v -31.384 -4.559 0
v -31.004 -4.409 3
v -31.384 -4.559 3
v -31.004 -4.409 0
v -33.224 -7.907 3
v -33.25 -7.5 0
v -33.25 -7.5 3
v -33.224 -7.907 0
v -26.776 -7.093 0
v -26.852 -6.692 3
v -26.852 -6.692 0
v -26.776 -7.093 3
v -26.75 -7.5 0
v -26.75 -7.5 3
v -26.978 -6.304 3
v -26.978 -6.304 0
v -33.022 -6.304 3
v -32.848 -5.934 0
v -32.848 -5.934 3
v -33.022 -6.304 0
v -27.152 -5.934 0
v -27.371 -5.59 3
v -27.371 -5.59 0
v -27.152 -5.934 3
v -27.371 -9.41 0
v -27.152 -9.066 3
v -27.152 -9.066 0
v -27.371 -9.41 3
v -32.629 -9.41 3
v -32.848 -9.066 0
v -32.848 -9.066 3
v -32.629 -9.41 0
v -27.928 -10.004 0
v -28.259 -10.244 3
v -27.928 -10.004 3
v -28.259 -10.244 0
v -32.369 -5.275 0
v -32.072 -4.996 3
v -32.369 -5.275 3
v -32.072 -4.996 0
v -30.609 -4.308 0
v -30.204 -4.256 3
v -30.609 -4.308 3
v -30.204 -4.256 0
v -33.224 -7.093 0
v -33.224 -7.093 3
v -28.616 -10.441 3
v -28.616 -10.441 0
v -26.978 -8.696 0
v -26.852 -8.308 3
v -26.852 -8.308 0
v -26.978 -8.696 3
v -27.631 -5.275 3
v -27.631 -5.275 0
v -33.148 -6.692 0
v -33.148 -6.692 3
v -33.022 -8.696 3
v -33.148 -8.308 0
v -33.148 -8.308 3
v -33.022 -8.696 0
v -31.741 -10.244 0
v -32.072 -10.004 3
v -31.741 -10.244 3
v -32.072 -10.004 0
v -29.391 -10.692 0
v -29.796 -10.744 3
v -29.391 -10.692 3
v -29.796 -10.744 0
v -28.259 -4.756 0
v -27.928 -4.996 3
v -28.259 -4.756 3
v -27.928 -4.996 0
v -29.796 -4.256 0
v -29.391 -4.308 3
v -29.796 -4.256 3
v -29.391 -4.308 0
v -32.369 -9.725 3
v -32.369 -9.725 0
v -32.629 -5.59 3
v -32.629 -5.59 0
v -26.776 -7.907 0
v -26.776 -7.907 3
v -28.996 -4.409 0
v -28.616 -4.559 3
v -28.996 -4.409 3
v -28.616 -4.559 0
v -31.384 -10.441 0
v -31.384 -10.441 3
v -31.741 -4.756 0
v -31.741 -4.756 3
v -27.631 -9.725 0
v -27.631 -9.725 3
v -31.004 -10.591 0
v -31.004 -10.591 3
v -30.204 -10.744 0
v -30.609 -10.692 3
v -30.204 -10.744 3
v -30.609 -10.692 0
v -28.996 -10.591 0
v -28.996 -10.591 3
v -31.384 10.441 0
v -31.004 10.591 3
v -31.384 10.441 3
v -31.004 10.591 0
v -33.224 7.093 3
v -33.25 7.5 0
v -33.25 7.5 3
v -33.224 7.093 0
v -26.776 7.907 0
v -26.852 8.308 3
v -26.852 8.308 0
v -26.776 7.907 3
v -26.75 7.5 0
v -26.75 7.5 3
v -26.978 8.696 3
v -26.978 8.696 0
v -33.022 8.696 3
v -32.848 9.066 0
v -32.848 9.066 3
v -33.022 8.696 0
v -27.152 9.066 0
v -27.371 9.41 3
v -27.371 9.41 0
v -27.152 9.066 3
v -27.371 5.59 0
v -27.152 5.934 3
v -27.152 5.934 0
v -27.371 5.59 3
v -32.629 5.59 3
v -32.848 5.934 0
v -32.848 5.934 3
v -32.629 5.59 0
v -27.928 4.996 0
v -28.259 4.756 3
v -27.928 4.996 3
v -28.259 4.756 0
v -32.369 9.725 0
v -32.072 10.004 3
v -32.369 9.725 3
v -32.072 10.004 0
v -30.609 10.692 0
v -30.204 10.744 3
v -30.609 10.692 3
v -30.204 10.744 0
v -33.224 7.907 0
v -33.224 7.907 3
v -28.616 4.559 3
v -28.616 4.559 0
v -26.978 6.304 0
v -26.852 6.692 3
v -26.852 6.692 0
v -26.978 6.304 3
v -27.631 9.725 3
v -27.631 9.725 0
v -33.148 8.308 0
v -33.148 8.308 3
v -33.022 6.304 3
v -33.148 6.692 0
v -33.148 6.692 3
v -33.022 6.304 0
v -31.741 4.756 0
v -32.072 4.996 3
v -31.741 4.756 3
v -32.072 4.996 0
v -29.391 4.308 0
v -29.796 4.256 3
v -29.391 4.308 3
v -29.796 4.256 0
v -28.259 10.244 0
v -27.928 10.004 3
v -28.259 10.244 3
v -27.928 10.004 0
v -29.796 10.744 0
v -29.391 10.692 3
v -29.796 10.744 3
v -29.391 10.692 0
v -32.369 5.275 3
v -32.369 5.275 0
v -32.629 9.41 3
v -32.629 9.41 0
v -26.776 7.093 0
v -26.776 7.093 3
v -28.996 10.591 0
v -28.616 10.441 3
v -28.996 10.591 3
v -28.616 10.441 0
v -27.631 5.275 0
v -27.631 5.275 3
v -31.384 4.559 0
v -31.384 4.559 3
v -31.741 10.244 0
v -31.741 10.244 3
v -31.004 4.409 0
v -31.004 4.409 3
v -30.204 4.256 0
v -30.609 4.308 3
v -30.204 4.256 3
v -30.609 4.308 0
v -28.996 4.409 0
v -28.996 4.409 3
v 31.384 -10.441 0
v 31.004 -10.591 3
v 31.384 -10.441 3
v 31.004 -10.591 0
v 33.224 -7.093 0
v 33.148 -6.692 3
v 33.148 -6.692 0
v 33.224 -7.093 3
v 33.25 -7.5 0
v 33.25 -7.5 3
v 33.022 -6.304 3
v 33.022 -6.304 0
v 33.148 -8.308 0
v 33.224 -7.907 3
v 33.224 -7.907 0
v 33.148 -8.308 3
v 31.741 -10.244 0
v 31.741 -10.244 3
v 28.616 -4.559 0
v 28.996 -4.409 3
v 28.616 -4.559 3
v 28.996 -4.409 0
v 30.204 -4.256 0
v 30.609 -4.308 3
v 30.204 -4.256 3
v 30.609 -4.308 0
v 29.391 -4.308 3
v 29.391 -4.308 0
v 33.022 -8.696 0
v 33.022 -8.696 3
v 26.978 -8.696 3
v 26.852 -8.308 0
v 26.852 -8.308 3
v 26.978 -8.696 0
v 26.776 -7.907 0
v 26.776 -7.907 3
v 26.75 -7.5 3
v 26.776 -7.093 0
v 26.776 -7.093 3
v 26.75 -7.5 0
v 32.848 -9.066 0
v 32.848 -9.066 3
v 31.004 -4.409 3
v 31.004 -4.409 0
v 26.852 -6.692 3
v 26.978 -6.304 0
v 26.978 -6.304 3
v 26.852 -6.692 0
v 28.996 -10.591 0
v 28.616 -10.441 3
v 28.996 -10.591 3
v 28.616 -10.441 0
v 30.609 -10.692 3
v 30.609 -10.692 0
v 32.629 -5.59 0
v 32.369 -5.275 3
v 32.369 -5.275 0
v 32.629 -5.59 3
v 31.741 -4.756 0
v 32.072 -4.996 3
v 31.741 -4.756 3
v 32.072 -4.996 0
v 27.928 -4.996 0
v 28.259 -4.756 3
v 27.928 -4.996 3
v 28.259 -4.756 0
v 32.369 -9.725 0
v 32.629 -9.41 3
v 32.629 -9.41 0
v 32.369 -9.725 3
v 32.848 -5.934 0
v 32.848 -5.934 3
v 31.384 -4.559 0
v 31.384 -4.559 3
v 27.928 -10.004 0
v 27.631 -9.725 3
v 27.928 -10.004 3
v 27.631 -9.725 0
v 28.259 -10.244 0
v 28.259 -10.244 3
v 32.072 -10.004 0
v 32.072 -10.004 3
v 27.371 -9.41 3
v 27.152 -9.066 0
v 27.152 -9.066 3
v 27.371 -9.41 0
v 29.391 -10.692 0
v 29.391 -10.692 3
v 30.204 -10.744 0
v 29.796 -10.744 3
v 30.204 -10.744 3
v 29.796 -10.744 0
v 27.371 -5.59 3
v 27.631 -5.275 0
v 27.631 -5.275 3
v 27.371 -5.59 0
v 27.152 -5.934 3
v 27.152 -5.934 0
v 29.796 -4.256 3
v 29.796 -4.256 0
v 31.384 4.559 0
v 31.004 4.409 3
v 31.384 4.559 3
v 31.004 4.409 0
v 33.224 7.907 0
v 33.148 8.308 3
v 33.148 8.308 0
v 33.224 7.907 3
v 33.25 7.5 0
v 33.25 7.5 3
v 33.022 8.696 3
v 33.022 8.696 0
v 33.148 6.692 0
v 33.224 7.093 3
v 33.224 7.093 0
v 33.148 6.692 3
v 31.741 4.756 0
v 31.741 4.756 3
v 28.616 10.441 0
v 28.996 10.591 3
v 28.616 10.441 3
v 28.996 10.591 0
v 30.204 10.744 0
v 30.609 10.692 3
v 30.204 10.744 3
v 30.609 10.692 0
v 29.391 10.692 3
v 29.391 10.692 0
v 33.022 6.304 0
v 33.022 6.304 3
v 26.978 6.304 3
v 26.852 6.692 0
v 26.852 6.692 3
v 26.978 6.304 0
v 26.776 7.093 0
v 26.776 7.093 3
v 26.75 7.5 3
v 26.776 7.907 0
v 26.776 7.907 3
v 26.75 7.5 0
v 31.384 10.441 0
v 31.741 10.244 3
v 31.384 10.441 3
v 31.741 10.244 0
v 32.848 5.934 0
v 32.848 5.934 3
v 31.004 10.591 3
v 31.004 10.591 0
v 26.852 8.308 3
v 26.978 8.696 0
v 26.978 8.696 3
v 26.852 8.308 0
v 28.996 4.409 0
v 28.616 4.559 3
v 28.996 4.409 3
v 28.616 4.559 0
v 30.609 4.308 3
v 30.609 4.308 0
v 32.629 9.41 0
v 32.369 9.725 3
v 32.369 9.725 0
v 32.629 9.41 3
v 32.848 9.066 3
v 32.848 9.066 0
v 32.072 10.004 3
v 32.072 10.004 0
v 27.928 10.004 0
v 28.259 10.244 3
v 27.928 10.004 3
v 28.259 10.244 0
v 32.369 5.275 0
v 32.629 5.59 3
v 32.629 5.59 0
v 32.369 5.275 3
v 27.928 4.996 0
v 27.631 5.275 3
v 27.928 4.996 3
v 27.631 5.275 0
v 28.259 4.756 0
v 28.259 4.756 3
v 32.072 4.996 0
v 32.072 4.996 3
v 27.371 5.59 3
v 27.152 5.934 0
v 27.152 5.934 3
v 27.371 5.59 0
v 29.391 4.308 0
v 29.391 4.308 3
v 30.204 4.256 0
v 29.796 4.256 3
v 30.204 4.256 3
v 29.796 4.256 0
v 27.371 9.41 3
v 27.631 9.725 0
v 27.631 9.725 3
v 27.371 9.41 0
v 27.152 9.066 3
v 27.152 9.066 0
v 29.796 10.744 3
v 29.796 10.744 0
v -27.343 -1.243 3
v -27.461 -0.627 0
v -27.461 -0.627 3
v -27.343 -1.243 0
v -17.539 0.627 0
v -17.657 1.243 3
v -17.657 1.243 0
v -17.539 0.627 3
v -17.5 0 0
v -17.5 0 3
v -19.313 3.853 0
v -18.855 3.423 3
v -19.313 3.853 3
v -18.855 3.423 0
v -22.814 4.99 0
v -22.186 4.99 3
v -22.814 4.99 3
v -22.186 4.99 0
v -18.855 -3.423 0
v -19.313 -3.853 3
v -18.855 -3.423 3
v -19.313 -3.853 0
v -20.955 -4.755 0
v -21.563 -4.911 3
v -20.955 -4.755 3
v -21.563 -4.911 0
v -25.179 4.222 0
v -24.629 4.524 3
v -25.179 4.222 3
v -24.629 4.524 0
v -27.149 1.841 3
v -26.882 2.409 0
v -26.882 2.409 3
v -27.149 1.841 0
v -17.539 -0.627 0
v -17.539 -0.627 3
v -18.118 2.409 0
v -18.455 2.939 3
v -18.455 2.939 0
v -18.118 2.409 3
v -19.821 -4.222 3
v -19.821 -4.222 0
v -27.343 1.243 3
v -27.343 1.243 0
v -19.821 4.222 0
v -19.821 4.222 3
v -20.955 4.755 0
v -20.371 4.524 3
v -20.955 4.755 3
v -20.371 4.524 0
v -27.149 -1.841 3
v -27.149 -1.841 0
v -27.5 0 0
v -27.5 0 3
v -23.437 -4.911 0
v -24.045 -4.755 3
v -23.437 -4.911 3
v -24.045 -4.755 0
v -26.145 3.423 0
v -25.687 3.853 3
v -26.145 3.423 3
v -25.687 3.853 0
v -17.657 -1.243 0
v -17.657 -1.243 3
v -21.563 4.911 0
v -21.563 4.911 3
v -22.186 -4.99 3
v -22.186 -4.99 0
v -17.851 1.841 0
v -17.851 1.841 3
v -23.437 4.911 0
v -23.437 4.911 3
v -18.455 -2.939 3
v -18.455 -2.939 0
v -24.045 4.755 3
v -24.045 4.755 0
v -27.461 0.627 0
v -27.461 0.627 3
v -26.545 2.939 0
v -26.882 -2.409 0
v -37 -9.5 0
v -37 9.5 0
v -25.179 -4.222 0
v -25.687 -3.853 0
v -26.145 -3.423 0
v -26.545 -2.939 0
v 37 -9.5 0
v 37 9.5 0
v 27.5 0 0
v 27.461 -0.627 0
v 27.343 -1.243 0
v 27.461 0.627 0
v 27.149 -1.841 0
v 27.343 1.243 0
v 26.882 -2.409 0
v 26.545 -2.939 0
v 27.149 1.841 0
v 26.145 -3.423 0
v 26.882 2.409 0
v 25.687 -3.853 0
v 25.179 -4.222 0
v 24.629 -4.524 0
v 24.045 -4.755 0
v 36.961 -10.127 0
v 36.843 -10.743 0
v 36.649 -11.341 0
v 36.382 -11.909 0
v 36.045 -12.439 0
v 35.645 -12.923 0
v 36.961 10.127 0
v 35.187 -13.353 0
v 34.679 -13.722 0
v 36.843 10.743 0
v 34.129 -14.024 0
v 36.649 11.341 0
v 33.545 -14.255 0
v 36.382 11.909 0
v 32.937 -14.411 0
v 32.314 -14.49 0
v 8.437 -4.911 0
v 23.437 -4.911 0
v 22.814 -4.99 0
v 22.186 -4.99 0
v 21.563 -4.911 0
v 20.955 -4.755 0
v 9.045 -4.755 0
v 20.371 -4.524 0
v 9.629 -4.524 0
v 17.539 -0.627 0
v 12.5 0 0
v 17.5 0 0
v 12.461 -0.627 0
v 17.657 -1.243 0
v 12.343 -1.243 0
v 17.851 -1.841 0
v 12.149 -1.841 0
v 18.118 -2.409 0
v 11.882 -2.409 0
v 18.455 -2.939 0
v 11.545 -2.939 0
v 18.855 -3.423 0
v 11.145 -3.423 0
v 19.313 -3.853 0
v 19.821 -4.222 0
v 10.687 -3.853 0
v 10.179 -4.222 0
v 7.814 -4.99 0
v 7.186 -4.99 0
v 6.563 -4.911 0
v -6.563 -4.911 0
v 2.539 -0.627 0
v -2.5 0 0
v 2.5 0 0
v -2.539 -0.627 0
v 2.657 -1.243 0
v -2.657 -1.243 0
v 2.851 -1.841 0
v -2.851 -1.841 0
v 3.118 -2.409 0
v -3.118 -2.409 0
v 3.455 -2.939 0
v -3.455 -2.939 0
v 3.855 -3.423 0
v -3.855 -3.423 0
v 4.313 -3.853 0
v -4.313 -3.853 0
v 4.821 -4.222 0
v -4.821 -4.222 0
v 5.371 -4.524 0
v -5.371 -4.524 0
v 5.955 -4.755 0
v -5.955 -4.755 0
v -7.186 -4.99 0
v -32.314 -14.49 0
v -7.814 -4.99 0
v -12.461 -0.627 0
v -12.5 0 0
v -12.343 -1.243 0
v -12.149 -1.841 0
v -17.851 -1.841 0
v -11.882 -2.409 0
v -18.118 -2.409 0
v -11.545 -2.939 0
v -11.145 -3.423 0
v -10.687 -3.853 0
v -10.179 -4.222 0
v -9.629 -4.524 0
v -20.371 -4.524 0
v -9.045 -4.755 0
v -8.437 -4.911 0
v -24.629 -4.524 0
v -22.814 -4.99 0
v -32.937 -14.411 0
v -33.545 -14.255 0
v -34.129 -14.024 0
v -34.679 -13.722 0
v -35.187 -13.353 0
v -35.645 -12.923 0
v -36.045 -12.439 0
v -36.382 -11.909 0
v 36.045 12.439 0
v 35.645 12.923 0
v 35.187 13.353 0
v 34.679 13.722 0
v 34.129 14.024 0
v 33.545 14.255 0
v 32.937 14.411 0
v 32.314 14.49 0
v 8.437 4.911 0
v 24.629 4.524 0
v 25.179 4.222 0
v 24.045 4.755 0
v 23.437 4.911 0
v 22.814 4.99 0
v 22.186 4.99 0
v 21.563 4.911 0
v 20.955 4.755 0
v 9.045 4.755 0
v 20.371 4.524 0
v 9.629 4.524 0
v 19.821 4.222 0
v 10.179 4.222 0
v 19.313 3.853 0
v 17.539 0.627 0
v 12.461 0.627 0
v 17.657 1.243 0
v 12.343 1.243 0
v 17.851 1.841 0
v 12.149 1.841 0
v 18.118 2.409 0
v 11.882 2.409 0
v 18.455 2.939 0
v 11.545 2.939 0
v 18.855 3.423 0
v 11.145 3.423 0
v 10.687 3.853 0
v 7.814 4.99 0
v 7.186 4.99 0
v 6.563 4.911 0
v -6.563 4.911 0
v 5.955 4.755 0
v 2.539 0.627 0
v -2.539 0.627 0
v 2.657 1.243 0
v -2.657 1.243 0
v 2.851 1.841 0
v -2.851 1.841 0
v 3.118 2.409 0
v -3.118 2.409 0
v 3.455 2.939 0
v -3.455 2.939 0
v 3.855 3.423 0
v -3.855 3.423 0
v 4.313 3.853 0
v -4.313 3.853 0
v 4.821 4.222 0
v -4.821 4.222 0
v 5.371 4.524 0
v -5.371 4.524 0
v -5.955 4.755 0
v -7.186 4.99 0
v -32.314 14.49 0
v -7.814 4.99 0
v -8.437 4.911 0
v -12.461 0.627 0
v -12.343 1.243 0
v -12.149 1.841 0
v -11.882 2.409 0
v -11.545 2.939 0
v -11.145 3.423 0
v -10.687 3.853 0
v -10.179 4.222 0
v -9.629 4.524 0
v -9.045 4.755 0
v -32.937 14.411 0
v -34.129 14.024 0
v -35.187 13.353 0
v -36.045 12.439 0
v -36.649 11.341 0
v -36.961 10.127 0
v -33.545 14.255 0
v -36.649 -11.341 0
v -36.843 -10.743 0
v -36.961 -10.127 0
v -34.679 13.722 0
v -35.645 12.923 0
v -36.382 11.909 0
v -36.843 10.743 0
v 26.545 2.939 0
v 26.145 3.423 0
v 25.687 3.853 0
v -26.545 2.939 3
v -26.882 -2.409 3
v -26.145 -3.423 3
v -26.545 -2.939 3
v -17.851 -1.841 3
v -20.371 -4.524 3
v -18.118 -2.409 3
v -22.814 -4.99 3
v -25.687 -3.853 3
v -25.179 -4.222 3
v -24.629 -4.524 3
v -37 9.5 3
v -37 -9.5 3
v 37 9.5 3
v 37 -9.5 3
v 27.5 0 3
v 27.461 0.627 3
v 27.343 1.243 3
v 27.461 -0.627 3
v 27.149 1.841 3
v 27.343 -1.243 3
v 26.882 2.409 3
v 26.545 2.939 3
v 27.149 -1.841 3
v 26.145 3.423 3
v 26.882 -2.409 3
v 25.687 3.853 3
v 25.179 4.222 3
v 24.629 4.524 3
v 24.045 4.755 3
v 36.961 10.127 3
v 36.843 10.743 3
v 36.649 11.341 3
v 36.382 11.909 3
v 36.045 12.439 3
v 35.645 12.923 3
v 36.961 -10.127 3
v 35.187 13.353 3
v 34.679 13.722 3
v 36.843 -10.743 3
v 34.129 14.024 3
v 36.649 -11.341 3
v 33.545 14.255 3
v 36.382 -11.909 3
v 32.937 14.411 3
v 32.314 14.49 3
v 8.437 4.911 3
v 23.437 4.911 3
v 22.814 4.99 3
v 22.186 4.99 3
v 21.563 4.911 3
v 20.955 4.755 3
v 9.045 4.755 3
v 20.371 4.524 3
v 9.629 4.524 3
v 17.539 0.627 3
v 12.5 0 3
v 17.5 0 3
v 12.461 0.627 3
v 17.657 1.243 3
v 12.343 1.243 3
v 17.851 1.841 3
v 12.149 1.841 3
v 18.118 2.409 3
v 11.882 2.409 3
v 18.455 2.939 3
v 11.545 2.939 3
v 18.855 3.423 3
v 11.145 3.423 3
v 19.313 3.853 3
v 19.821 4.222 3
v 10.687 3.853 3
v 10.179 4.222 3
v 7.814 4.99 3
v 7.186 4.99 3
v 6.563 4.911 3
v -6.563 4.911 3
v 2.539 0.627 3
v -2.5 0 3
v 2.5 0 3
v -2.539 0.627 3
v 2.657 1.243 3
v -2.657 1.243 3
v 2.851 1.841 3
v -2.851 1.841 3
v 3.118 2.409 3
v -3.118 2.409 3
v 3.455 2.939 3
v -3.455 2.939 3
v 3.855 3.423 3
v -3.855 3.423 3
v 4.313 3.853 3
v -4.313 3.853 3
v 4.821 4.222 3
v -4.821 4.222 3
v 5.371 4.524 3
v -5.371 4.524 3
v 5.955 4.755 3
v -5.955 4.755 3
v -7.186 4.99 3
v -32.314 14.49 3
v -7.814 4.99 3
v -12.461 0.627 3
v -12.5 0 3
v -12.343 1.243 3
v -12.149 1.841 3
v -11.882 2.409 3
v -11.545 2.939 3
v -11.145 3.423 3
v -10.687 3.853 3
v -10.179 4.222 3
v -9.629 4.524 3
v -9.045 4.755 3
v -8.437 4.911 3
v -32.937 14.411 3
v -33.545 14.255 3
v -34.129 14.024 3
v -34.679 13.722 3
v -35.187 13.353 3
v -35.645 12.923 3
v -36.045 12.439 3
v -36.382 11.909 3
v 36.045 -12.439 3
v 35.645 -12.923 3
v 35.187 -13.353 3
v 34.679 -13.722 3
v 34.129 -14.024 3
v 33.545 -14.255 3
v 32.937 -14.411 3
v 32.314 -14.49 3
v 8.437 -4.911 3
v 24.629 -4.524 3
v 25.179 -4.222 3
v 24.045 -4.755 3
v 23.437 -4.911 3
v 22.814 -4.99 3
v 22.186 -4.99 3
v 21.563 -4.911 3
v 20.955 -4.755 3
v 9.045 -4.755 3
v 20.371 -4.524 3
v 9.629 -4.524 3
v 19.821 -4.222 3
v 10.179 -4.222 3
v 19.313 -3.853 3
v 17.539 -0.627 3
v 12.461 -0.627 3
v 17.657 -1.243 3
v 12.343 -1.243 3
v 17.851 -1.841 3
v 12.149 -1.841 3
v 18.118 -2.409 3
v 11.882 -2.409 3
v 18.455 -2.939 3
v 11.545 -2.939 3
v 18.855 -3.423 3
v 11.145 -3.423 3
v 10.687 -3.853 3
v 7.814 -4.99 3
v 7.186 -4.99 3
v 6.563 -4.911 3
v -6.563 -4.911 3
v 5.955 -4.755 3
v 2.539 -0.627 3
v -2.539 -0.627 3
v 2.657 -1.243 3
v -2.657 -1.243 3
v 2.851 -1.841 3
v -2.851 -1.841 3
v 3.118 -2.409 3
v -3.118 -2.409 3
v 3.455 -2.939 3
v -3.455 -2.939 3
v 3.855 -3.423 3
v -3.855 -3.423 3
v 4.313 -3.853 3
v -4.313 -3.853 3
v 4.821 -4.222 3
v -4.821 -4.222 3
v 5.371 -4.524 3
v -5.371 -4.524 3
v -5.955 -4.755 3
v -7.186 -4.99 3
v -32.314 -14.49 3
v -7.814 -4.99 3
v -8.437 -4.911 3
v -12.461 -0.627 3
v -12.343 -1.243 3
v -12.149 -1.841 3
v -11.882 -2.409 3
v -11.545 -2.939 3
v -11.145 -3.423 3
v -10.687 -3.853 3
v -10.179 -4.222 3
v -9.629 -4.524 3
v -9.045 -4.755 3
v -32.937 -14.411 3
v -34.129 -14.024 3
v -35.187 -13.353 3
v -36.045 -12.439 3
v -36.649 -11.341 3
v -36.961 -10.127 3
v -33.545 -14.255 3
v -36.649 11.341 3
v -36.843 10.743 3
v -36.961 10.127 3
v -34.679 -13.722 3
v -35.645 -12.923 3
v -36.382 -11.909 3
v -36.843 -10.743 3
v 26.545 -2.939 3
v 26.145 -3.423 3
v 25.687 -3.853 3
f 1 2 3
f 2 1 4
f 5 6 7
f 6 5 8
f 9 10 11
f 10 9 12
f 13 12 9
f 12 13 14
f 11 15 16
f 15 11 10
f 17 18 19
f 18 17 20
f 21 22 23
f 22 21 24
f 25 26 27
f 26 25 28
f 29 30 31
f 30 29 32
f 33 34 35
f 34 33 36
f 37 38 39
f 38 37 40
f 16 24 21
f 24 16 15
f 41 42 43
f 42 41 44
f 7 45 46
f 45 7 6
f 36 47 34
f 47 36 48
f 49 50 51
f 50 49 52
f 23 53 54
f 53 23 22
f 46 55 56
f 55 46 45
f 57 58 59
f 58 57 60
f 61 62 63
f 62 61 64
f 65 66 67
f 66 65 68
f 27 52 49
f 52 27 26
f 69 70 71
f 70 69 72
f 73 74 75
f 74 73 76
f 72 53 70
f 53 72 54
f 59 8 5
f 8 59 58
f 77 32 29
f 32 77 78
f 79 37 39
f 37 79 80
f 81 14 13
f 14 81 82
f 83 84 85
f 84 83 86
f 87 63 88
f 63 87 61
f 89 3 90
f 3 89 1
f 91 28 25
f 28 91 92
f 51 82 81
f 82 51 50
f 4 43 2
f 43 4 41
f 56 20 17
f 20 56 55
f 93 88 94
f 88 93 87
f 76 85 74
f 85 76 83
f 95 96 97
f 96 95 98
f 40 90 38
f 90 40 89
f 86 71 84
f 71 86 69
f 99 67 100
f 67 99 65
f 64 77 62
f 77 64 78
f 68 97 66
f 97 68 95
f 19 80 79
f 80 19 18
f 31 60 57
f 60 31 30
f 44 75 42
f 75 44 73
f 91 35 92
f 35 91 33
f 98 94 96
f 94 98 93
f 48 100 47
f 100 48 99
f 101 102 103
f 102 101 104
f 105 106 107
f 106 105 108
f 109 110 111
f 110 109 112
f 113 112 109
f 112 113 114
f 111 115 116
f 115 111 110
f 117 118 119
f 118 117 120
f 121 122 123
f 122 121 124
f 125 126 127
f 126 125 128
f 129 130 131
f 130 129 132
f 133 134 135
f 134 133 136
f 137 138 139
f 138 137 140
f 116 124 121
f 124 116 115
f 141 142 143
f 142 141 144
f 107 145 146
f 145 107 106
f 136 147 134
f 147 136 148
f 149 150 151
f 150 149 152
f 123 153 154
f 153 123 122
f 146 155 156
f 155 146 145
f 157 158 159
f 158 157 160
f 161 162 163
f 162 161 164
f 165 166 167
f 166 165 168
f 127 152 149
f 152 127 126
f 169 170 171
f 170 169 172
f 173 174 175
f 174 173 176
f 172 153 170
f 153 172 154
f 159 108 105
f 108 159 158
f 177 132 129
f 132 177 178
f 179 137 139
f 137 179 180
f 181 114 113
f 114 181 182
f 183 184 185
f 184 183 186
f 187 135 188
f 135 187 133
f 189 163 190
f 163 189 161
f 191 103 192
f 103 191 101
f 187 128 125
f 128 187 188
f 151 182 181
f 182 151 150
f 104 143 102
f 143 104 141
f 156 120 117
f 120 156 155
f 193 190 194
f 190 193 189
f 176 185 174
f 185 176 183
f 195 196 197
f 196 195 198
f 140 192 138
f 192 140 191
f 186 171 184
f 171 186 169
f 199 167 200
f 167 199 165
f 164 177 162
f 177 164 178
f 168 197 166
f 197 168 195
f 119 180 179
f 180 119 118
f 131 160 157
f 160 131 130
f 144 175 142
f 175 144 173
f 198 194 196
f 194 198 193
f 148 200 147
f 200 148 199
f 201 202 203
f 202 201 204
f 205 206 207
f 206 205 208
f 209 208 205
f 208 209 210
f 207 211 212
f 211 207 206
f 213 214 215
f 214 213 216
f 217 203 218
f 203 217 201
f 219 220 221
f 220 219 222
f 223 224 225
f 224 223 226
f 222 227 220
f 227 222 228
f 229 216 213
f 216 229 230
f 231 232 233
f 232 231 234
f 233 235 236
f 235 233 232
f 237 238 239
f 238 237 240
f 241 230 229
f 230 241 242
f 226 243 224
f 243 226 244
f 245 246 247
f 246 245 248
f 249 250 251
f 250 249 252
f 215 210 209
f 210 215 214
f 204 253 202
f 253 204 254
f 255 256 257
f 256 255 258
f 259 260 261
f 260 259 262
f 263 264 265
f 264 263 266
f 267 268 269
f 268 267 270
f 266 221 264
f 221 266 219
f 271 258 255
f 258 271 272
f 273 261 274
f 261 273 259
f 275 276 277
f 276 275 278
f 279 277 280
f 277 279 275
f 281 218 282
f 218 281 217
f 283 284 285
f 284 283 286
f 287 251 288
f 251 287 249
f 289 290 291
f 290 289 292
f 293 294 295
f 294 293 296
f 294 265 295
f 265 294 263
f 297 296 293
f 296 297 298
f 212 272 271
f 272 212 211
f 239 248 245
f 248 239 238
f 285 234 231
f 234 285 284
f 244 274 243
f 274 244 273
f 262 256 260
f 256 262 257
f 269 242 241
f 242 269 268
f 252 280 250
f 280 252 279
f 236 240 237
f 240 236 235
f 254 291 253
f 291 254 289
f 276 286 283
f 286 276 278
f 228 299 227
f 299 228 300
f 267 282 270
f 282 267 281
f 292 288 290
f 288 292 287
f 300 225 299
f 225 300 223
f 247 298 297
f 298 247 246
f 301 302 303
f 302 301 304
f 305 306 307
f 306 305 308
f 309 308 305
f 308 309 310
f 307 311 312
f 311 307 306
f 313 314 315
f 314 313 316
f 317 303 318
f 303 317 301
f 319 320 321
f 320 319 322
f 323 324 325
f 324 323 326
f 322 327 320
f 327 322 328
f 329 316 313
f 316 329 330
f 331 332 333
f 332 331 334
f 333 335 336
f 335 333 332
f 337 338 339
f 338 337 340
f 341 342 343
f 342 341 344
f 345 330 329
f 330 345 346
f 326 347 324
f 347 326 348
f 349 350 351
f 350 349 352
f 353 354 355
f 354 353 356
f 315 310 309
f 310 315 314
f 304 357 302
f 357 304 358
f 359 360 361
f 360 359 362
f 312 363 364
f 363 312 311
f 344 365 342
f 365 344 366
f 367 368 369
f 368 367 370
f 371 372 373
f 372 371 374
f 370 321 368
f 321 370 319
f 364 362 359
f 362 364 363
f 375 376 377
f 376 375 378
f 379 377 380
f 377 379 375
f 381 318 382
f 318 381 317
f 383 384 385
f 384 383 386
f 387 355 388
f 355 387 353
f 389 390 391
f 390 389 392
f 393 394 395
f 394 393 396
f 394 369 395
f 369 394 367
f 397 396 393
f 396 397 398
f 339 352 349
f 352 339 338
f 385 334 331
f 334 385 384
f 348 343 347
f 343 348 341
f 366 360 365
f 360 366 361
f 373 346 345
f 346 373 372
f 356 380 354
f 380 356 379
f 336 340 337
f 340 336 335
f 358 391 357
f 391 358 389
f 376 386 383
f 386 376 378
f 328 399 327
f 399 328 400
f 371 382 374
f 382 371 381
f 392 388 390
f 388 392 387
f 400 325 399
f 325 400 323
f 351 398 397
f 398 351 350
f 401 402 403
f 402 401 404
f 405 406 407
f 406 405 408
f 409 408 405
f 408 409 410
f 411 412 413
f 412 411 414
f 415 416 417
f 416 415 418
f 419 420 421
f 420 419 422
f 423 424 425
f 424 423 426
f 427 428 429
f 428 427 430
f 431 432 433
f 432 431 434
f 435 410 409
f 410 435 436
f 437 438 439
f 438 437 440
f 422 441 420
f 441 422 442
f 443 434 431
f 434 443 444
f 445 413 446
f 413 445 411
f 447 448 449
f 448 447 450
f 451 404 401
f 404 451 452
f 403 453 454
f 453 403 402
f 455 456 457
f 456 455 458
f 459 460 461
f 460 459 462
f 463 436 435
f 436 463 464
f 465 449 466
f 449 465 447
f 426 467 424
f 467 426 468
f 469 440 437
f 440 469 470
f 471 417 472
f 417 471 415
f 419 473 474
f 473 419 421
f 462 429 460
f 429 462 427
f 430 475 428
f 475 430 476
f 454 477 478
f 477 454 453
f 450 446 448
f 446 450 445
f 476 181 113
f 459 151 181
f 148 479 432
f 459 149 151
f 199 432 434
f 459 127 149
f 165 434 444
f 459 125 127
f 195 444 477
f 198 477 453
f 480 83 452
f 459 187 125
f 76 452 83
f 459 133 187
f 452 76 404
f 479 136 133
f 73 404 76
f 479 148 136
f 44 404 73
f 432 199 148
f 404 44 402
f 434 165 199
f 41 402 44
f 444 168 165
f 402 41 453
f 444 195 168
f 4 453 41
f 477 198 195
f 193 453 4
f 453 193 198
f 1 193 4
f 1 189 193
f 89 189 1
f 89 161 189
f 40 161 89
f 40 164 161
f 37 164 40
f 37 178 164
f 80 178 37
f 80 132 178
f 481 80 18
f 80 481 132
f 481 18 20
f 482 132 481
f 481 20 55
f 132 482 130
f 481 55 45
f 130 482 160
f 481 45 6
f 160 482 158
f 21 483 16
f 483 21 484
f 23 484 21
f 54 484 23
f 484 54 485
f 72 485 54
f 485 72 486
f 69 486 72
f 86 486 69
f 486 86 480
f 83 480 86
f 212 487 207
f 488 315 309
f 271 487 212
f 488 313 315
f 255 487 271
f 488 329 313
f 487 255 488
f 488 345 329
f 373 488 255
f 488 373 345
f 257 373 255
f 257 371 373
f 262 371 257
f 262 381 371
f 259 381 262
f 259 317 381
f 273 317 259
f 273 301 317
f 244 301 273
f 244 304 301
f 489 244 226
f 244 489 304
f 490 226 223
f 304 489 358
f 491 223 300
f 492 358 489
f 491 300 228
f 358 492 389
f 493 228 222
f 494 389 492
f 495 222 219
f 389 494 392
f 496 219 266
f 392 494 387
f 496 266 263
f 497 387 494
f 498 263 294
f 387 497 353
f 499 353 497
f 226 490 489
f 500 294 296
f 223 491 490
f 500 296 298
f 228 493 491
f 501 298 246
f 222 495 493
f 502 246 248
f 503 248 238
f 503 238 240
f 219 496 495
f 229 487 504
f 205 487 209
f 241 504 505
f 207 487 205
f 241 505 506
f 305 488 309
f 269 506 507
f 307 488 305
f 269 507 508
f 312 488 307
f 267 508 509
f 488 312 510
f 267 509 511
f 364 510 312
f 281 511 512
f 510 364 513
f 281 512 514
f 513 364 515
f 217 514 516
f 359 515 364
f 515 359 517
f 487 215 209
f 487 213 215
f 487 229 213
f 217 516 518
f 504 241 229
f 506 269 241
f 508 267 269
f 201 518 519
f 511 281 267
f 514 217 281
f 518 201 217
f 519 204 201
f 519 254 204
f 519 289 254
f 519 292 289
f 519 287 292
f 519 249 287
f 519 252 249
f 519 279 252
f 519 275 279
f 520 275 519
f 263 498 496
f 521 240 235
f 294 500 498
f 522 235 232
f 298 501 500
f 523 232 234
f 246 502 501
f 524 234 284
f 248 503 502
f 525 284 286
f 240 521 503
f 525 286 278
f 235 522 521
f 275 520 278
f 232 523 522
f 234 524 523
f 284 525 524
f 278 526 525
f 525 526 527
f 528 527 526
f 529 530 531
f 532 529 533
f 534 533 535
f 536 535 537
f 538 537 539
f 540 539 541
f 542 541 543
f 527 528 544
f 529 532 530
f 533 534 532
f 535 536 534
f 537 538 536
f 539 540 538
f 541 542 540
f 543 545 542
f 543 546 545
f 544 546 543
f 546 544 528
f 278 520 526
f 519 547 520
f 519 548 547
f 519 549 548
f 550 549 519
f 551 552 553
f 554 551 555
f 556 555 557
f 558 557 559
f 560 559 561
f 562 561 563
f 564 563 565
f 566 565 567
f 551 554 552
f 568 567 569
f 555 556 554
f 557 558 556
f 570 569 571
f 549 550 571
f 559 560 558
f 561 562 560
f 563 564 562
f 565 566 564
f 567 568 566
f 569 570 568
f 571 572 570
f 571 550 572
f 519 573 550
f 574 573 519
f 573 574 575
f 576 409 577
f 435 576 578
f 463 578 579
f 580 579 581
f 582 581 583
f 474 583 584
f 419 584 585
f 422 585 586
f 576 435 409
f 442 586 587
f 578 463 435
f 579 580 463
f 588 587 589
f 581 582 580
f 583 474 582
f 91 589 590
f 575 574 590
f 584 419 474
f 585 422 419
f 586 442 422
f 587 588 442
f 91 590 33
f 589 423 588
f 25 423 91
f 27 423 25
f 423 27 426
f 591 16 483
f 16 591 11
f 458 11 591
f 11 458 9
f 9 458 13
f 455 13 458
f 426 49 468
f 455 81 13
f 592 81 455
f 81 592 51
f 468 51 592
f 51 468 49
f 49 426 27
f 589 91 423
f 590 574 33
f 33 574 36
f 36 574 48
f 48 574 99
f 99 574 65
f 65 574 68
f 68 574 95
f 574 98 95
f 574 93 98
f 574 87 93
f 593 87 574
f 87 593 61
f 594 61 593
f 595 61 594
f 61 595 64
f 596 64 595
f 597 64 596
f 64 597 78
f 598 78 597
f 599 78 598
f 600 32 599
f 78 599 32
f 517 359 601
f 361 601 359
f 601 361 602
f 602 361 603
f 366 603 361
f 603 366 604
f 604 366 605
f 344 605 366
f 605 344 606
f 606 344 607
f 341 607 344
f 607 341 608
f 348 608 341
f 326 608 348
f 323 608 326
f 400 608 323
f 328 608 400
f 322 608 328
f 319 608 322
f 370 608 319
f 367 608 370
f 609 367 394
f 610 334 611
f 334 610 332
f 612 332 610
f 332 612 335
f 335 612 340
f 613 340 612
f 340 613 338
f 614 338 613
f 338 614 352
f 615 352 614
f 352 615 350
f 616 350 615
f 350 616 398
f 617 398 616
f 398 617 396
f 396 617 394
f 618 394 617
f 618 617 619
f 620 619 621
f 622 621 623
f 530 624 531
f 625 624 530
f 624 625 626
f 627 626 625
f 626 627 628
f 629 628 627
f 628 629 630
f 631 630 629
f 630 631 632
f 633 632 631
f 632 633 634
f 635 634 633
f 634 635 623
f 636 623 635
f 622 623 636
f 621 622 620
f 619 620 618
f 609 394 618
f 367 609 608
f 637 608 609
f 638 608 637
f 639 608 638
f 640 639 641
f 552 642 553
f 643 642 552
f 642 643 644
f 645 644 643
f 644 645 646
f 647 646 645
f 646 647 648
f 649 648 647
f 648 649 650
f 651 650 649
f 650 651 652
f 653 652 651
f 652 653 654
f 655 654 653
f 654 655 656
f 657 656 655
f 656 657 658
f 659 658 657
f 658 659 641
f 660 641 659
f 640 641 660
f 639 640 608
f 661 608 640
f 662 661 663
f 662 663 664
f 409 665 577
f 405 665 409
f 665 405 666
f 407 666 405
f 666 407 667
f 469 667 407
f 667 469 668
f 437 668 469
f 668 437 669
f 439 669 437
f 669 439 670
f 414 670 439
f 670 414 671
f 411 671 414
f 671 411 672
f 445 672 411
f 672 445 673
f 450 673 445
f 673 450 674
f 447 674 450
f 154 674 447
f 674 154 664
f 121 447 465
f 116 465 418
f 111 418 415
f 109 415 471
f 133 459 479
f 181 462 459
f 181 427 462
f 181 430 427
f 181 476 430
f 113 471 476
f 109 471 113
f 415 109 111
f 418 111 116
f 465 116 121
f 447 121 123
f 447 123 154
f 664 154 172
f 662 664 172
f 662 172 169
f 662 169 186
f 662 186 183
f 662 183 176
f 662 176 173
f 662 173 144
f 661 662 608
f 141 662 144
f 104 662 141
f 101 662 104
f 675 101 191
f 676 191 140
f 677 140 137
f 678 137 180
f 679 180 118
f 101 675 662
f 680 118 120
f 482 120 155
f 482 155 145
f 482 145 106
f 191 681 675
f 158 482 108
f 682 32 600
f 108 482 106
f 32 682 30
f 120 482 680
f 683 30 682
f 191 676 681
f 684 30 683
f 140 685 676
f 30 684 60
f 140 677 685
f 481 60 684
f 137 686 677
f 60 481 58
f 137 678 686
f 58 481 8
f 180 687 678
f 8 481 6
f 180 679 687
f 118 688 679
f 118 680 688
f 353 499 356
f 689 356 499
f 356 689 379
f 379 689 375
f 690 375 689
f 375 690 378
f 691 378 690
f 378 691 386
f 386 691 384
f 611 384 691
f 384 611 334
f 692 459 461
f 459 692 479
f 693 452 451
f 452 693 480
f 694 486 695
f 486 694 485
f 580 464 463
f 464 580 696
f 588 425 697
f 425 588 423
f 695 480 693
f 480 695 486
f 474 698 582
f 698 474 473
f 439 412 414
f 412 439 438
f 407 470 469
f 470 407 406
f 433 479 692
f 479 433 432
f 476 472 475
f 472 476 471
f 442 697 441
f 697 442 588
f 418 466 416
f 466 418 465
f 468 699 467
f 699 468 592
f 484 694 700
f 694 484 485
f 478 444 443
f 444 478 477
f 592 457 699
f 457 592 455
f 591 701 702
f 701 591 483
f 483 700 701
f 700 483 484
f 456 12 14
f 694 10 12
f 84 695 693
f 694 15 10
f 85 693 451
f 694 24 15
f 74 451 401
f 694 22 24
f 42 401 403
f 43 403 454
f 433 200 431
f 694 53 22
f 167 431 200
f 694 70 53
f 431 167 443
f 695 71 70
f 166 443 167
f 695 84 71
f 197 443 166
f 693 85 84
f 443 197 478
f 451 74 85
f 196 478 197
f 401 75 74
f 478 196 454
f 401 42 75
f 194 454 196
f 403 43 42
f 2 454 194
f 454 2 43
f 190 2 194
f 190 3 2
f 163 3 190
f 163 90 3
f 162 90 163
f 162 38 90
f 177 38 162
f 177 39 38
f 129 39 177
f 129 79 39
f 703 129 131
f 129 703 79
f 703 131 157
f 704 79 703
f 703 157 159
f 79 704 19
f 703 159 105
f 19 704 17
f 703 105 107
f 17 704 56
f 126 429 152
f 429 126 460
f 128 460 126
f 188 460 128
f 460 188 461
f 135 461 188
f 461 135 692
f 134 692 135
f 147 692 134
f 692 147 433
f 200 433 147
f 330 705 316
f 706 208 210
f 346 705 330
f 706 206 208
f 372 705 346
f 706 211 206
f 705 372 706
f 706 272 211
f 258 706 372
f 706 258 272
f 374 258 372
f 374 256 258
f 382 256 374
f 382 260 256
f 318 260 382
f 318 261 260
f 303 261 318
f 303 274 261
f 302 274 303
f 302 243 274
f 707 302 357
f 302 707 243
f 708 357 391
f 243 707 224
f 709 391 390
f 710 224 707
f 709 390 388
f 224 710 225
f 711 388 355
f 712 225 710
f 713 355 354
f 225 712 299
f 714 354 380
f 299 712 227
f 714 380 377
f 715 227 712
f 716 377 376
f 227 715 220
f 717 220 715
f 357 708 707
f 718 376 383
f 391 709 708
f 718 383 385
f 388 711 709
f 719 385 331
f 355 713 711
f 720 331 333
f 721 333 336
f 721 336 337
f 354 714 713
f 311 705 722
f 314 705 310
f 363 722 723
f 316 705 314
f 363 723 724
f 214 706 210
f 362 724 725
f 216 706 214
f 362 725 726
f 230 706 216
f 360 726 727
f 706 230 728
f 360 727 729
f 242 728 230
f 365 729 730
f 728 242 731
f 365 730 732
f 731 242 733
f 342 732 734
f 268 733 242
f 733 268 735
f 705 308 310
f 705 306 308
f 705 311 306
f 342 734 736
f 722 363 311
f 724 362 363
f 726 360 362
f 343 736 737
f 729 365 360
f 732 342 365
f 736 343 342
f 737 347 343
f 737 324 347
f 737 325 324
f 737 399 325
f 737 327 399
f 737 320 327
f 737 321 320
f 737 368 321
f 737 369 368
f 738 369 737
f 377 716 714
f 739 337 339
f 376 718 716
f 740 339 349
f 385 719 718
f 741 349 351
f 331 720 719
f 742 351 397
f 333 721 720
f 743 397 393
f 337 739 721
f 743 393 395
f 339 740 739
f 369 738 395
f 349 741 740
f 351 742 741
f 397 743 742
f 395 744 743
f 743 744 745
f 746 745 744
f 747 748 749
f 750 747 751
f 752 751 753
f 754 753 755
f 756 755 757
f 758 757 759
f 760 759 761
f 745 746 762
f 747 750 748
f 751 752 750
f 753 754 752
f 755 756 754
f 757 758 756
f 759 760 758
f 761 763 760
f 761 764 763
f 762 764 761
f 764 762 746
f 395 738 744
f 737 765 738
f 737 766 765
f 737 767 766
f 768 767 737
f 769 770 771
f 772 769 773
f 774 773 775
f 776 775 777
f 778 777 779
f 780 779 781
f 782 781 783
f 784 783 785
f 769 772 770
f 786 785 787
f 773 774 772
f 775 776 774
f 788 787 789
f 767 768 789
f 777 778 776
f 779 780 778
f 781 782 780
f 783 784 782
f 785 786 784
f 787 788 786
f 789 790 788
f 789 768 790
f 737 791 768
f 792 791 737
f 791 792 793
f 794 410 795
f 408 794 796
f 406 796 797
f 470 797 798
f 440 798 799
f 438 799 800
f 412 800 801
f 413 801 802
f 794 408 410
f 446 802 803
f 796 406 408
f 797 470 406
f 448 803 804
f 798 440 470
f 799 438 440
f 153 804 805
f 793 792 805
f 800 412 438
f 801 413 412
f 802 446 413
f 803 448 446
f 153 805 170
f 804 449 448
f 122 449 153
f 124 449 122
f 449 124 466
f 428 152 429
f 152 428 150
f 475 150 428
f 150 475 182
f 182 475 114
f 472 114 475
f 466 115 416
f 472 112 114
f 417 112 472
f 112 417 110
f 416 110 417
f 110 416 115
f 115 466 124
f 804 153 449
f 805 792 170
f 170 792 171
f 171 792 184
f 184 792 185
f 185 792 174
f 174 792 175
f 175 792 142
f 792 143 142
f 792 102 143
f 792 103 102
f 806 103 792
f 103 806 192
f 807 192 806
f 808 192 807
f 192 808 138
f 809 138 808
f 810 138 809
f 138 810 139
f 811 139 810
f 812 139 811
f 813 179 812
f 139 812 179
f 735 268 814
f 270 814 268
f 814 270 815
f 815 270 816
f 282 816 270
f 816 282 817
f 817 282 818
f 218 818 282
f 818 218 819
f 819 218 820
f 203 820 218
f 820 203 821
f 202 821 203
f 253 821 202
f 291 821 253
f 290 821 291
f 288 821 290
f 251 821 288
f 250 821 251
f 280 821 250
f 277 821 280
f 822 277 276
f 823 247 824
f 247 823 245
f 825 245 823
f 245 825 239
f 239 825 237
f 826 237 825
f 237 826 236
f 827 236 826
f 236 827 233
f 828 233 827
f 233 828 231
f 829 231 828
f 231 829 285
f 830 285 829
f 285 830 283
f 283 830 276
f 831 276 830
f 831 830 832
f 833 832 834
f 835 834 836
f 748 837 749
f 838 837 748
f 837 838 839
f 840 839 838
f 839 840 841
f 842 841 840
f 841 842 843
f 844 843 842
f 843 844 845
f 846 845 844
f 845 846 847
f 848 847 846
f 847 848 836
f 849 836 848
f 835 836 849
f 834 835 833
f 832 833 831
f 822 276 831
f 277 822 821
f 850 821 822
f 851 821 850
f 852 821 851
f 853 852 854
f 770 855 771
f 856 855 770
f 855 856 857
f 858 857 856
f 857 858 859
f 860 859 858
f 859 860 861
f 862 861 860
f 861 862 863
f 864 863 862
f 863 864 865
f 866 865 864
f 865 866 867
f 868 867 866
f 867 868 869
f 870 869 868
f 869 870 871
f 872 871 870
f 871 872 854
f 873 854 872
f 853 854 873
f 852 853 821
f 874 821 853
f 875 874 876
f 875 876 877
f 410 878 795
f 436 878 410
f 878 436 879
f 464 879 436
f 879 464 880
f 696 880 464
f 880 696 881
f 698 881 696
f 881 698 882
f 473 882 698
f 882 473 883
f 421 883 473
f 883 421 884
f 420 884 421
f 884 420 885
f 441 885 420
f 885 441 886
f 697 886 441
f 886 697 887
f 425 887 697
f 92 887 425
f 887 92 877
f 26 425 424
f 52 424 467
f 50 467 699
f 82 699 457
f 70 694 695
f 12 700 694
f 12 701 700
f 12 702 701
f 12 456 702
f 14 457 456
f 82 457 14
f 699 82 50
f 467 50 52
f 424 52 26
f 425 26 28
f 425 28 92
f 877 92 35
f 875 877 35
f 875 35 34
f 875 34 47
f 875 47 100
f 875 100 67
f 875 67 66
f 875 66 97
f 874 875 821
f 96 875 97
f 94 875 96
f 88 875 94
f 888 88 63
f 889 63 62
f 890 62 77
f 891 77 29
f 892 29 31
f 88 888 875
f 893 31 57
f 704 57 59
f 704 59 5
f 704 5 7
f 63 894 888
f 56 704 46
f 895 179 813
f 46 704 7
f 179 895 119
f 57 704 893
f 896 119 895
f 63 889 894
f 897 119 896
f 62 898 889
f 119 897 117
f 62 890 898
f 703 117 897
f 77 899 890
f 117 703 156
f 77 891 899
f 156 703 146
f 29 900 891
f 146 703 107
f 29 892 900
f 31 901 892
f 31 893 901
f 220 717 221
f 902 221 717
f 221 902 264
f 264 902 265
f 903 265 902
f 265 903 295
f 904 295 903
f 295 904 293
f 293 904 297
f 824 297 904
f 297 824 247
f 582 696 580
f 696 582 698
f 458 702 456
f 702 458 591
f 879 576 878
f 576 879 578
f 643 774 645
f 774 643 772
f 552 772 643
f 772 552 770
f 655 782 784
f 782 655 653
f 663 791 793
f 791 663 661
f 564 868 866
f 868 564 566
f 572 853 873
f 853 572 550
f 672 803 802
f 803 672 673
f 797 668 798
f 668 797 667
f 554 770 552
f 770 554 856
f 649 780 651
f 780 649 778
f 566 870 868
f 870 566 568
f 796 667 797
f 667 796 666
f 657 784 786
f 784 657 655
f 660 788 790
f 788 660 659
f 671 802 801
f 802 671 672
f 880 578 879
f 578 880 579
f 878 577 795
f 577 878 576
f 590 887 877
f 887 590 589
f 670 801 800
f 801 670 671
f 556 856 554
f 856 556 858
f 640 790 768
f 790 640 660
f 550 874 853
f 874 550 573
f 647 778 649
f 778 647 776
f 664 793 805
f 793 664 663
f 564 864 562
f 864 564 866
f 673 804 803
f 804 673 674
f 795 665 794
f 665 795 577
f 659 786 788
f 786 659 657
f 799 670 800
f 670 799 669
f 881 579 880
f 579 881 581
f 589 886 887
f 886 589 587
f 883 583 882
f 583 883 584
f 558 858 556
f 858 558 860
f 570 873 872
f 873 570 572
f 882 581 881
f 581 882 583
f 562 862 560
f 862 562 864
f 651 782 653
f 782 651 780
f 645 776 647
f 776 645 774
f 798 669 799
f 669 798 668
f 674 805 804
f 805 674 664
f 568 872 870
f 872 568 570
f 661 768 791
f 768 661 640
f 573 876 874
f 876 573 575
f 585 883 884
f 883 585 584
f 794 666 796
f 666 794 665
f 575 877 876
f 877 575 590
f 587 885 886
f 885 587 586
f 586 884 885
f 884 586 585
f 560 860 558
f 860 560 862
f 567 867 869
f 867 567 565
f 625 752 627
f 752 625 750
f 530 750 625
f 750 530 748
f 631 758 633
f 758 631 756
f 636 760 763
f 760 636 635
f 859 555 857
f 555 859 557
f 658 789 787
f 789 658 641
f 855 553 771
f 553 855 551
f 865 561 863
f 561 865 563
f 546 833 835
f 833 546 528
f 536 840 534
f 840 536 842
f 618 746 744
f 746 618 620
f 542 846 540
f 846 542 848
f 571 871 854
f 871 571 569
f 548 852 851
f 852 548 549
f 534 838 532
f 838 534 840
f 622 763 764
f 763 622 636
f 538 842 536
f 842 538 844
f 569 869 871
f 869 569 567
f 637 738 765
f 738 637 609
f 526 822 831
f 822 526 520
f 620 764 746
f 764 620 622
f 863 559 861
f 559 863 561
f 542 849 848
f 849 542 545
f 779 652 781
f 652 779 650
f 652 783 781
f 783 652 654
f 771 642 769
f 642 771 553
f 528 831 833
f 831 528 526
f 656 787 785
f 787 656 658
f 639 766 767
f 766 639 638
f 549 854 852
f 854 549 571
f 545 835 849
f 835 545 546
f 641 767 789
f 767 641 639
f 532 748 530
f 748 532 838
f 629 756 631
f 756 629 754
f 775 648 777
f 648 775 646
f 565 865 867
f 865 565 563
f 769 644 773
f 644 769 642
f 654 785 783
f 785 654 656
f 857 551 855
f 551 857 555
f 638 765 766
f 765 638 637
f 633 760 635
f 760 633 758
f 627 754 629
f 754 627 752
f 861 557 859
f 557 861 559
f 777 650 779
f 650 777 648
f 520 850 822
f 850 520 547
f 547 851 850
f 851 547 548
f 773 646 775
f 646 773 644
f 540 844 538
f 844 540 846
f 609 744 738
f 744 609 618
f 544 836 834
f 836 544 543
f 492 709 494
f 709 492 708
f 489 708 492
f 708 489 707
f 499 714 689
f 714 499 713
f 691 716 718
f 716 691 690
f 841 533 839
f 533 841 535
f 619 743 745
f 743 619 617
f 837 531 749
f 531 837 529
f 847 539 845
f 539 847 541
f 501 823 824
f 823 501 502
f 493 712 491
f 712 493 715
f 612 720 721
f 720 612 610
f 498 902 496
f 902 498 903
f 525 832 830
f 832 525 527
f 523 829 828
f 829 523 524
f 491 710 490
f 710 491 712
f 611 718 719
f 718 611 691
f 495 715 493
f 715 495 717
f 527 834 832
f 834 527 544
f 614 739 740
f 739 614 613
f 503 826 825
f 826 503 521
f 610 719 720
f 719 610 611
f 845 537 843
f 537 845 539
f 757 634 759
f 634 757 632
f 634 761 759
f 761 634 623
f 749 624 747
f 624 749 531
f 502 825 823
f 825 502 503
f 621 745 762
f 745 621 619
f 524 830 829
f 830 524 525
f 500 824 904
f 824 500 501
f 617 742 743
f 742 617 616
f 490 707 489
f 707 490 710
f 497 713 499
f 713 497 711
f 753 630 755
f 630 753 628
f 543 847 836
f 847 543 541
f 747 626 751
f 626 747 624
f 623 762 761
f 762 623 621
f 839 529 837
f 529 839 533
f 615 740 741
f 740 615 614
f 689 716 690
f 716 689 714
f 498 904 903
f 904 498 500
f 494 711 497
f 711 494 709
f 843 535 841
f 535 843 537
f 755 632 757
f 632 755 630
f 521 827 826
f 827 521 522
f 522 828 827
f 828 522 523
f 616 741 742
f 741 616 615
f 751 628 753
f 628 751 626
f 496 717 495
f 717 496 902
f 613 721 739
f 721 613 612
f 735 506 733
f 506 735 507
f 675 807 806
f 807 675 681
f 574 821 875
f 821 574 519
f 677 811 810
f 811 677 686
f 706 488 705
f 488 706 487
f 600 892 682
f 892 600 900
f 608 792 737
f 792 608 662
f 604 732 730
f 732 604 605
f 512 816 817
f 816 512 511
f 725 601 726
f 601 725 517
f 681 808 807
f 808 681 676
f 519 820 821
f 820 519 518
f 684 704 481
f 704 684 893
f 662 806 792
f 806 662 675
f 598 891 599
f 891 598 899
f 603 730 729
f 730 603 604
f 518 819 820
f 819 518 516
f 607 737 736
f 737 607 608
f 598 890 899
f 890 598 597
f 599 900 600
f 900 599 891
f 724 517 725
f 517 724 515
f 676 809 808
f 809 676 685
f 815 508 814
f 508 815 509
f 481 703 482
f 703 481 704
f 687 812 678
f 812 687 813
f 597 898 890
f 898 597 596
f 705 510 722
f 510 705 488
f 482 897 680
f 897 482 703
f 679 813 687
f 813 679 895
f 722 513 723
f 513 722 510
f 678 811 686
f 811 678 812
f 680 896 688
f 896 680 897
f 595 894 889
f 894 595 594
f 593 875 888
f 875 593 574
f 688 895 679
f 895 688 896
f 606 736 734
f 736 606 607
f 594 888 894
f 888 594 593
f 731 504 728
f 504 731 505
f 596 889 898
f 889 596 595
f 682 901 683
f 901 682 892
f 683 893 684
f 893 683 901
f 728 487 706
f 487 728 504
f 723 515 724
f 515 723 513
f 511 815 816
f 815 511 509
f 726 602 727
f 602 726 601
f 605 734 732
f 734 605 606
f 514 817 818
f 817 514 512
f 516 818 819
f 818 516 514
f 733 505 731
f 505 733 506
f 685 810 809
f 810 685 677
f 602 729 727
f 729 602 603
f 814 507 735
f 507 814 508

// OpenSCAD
$fn = 50;


difference() {
	union() {
		hull() {
			translate(v = [-32.0000000000, 9.5000000000, 0]) {
				cylinder(h = 3, r = 5);
			}
			translate(v = [32.0000000000, 9.5000000000, 0]) {
				cylinder(h = 3, r = 5);
			}
			translate(v = [-32.0000000000, -9.5000000000, 0]) {
				cylinder(h = 3, r = 5);
			}
			translate(v = [32.0000000000, -9.5000000000, 0]) {
				cylinder(h = 3, r = 5);
			}
		}
	}
	union() {
		#translate(v = [-30.0000000000, -7.5000000000, -100.0000000000]) {
			cylinder(h = 200, r = 3.2500000000);
		}
		#translate(v = [-30.0000000000, 7.5000000000, -100.0000000000]) {
			cylinder(h = 200, r = 3.2500000000);
		}
		#translate(v = [30.0000000000, -7.5000000000, -100.0000000000]) {
			cylinder(h = 200, r = 3.2500000000);
		}
		#translate(v = [30.0000000000, 7.5000000000, -100.0000000000]) {
			cylinder(h = 200, r = 3.2500000000);
		}
		#translate(v = [-22.5000000000, 0, 0]) {
			cylinder(h = 3, r = 5.0000000000);
		}
		#translate(v = [-7.5000000000, 0, 0]) {
			cylinder(h = 3, r = 5.0000000000);
		}
		#translate(v = [7.5000000000, 0, 0]) {
			cylinder(h = 3, r = 5.0000000000);
		}
		#translate(v = [22.5000000000, 0, 0]) {
			cylinder(h = 3, r = 5.0000000000);
		}
	}
}
